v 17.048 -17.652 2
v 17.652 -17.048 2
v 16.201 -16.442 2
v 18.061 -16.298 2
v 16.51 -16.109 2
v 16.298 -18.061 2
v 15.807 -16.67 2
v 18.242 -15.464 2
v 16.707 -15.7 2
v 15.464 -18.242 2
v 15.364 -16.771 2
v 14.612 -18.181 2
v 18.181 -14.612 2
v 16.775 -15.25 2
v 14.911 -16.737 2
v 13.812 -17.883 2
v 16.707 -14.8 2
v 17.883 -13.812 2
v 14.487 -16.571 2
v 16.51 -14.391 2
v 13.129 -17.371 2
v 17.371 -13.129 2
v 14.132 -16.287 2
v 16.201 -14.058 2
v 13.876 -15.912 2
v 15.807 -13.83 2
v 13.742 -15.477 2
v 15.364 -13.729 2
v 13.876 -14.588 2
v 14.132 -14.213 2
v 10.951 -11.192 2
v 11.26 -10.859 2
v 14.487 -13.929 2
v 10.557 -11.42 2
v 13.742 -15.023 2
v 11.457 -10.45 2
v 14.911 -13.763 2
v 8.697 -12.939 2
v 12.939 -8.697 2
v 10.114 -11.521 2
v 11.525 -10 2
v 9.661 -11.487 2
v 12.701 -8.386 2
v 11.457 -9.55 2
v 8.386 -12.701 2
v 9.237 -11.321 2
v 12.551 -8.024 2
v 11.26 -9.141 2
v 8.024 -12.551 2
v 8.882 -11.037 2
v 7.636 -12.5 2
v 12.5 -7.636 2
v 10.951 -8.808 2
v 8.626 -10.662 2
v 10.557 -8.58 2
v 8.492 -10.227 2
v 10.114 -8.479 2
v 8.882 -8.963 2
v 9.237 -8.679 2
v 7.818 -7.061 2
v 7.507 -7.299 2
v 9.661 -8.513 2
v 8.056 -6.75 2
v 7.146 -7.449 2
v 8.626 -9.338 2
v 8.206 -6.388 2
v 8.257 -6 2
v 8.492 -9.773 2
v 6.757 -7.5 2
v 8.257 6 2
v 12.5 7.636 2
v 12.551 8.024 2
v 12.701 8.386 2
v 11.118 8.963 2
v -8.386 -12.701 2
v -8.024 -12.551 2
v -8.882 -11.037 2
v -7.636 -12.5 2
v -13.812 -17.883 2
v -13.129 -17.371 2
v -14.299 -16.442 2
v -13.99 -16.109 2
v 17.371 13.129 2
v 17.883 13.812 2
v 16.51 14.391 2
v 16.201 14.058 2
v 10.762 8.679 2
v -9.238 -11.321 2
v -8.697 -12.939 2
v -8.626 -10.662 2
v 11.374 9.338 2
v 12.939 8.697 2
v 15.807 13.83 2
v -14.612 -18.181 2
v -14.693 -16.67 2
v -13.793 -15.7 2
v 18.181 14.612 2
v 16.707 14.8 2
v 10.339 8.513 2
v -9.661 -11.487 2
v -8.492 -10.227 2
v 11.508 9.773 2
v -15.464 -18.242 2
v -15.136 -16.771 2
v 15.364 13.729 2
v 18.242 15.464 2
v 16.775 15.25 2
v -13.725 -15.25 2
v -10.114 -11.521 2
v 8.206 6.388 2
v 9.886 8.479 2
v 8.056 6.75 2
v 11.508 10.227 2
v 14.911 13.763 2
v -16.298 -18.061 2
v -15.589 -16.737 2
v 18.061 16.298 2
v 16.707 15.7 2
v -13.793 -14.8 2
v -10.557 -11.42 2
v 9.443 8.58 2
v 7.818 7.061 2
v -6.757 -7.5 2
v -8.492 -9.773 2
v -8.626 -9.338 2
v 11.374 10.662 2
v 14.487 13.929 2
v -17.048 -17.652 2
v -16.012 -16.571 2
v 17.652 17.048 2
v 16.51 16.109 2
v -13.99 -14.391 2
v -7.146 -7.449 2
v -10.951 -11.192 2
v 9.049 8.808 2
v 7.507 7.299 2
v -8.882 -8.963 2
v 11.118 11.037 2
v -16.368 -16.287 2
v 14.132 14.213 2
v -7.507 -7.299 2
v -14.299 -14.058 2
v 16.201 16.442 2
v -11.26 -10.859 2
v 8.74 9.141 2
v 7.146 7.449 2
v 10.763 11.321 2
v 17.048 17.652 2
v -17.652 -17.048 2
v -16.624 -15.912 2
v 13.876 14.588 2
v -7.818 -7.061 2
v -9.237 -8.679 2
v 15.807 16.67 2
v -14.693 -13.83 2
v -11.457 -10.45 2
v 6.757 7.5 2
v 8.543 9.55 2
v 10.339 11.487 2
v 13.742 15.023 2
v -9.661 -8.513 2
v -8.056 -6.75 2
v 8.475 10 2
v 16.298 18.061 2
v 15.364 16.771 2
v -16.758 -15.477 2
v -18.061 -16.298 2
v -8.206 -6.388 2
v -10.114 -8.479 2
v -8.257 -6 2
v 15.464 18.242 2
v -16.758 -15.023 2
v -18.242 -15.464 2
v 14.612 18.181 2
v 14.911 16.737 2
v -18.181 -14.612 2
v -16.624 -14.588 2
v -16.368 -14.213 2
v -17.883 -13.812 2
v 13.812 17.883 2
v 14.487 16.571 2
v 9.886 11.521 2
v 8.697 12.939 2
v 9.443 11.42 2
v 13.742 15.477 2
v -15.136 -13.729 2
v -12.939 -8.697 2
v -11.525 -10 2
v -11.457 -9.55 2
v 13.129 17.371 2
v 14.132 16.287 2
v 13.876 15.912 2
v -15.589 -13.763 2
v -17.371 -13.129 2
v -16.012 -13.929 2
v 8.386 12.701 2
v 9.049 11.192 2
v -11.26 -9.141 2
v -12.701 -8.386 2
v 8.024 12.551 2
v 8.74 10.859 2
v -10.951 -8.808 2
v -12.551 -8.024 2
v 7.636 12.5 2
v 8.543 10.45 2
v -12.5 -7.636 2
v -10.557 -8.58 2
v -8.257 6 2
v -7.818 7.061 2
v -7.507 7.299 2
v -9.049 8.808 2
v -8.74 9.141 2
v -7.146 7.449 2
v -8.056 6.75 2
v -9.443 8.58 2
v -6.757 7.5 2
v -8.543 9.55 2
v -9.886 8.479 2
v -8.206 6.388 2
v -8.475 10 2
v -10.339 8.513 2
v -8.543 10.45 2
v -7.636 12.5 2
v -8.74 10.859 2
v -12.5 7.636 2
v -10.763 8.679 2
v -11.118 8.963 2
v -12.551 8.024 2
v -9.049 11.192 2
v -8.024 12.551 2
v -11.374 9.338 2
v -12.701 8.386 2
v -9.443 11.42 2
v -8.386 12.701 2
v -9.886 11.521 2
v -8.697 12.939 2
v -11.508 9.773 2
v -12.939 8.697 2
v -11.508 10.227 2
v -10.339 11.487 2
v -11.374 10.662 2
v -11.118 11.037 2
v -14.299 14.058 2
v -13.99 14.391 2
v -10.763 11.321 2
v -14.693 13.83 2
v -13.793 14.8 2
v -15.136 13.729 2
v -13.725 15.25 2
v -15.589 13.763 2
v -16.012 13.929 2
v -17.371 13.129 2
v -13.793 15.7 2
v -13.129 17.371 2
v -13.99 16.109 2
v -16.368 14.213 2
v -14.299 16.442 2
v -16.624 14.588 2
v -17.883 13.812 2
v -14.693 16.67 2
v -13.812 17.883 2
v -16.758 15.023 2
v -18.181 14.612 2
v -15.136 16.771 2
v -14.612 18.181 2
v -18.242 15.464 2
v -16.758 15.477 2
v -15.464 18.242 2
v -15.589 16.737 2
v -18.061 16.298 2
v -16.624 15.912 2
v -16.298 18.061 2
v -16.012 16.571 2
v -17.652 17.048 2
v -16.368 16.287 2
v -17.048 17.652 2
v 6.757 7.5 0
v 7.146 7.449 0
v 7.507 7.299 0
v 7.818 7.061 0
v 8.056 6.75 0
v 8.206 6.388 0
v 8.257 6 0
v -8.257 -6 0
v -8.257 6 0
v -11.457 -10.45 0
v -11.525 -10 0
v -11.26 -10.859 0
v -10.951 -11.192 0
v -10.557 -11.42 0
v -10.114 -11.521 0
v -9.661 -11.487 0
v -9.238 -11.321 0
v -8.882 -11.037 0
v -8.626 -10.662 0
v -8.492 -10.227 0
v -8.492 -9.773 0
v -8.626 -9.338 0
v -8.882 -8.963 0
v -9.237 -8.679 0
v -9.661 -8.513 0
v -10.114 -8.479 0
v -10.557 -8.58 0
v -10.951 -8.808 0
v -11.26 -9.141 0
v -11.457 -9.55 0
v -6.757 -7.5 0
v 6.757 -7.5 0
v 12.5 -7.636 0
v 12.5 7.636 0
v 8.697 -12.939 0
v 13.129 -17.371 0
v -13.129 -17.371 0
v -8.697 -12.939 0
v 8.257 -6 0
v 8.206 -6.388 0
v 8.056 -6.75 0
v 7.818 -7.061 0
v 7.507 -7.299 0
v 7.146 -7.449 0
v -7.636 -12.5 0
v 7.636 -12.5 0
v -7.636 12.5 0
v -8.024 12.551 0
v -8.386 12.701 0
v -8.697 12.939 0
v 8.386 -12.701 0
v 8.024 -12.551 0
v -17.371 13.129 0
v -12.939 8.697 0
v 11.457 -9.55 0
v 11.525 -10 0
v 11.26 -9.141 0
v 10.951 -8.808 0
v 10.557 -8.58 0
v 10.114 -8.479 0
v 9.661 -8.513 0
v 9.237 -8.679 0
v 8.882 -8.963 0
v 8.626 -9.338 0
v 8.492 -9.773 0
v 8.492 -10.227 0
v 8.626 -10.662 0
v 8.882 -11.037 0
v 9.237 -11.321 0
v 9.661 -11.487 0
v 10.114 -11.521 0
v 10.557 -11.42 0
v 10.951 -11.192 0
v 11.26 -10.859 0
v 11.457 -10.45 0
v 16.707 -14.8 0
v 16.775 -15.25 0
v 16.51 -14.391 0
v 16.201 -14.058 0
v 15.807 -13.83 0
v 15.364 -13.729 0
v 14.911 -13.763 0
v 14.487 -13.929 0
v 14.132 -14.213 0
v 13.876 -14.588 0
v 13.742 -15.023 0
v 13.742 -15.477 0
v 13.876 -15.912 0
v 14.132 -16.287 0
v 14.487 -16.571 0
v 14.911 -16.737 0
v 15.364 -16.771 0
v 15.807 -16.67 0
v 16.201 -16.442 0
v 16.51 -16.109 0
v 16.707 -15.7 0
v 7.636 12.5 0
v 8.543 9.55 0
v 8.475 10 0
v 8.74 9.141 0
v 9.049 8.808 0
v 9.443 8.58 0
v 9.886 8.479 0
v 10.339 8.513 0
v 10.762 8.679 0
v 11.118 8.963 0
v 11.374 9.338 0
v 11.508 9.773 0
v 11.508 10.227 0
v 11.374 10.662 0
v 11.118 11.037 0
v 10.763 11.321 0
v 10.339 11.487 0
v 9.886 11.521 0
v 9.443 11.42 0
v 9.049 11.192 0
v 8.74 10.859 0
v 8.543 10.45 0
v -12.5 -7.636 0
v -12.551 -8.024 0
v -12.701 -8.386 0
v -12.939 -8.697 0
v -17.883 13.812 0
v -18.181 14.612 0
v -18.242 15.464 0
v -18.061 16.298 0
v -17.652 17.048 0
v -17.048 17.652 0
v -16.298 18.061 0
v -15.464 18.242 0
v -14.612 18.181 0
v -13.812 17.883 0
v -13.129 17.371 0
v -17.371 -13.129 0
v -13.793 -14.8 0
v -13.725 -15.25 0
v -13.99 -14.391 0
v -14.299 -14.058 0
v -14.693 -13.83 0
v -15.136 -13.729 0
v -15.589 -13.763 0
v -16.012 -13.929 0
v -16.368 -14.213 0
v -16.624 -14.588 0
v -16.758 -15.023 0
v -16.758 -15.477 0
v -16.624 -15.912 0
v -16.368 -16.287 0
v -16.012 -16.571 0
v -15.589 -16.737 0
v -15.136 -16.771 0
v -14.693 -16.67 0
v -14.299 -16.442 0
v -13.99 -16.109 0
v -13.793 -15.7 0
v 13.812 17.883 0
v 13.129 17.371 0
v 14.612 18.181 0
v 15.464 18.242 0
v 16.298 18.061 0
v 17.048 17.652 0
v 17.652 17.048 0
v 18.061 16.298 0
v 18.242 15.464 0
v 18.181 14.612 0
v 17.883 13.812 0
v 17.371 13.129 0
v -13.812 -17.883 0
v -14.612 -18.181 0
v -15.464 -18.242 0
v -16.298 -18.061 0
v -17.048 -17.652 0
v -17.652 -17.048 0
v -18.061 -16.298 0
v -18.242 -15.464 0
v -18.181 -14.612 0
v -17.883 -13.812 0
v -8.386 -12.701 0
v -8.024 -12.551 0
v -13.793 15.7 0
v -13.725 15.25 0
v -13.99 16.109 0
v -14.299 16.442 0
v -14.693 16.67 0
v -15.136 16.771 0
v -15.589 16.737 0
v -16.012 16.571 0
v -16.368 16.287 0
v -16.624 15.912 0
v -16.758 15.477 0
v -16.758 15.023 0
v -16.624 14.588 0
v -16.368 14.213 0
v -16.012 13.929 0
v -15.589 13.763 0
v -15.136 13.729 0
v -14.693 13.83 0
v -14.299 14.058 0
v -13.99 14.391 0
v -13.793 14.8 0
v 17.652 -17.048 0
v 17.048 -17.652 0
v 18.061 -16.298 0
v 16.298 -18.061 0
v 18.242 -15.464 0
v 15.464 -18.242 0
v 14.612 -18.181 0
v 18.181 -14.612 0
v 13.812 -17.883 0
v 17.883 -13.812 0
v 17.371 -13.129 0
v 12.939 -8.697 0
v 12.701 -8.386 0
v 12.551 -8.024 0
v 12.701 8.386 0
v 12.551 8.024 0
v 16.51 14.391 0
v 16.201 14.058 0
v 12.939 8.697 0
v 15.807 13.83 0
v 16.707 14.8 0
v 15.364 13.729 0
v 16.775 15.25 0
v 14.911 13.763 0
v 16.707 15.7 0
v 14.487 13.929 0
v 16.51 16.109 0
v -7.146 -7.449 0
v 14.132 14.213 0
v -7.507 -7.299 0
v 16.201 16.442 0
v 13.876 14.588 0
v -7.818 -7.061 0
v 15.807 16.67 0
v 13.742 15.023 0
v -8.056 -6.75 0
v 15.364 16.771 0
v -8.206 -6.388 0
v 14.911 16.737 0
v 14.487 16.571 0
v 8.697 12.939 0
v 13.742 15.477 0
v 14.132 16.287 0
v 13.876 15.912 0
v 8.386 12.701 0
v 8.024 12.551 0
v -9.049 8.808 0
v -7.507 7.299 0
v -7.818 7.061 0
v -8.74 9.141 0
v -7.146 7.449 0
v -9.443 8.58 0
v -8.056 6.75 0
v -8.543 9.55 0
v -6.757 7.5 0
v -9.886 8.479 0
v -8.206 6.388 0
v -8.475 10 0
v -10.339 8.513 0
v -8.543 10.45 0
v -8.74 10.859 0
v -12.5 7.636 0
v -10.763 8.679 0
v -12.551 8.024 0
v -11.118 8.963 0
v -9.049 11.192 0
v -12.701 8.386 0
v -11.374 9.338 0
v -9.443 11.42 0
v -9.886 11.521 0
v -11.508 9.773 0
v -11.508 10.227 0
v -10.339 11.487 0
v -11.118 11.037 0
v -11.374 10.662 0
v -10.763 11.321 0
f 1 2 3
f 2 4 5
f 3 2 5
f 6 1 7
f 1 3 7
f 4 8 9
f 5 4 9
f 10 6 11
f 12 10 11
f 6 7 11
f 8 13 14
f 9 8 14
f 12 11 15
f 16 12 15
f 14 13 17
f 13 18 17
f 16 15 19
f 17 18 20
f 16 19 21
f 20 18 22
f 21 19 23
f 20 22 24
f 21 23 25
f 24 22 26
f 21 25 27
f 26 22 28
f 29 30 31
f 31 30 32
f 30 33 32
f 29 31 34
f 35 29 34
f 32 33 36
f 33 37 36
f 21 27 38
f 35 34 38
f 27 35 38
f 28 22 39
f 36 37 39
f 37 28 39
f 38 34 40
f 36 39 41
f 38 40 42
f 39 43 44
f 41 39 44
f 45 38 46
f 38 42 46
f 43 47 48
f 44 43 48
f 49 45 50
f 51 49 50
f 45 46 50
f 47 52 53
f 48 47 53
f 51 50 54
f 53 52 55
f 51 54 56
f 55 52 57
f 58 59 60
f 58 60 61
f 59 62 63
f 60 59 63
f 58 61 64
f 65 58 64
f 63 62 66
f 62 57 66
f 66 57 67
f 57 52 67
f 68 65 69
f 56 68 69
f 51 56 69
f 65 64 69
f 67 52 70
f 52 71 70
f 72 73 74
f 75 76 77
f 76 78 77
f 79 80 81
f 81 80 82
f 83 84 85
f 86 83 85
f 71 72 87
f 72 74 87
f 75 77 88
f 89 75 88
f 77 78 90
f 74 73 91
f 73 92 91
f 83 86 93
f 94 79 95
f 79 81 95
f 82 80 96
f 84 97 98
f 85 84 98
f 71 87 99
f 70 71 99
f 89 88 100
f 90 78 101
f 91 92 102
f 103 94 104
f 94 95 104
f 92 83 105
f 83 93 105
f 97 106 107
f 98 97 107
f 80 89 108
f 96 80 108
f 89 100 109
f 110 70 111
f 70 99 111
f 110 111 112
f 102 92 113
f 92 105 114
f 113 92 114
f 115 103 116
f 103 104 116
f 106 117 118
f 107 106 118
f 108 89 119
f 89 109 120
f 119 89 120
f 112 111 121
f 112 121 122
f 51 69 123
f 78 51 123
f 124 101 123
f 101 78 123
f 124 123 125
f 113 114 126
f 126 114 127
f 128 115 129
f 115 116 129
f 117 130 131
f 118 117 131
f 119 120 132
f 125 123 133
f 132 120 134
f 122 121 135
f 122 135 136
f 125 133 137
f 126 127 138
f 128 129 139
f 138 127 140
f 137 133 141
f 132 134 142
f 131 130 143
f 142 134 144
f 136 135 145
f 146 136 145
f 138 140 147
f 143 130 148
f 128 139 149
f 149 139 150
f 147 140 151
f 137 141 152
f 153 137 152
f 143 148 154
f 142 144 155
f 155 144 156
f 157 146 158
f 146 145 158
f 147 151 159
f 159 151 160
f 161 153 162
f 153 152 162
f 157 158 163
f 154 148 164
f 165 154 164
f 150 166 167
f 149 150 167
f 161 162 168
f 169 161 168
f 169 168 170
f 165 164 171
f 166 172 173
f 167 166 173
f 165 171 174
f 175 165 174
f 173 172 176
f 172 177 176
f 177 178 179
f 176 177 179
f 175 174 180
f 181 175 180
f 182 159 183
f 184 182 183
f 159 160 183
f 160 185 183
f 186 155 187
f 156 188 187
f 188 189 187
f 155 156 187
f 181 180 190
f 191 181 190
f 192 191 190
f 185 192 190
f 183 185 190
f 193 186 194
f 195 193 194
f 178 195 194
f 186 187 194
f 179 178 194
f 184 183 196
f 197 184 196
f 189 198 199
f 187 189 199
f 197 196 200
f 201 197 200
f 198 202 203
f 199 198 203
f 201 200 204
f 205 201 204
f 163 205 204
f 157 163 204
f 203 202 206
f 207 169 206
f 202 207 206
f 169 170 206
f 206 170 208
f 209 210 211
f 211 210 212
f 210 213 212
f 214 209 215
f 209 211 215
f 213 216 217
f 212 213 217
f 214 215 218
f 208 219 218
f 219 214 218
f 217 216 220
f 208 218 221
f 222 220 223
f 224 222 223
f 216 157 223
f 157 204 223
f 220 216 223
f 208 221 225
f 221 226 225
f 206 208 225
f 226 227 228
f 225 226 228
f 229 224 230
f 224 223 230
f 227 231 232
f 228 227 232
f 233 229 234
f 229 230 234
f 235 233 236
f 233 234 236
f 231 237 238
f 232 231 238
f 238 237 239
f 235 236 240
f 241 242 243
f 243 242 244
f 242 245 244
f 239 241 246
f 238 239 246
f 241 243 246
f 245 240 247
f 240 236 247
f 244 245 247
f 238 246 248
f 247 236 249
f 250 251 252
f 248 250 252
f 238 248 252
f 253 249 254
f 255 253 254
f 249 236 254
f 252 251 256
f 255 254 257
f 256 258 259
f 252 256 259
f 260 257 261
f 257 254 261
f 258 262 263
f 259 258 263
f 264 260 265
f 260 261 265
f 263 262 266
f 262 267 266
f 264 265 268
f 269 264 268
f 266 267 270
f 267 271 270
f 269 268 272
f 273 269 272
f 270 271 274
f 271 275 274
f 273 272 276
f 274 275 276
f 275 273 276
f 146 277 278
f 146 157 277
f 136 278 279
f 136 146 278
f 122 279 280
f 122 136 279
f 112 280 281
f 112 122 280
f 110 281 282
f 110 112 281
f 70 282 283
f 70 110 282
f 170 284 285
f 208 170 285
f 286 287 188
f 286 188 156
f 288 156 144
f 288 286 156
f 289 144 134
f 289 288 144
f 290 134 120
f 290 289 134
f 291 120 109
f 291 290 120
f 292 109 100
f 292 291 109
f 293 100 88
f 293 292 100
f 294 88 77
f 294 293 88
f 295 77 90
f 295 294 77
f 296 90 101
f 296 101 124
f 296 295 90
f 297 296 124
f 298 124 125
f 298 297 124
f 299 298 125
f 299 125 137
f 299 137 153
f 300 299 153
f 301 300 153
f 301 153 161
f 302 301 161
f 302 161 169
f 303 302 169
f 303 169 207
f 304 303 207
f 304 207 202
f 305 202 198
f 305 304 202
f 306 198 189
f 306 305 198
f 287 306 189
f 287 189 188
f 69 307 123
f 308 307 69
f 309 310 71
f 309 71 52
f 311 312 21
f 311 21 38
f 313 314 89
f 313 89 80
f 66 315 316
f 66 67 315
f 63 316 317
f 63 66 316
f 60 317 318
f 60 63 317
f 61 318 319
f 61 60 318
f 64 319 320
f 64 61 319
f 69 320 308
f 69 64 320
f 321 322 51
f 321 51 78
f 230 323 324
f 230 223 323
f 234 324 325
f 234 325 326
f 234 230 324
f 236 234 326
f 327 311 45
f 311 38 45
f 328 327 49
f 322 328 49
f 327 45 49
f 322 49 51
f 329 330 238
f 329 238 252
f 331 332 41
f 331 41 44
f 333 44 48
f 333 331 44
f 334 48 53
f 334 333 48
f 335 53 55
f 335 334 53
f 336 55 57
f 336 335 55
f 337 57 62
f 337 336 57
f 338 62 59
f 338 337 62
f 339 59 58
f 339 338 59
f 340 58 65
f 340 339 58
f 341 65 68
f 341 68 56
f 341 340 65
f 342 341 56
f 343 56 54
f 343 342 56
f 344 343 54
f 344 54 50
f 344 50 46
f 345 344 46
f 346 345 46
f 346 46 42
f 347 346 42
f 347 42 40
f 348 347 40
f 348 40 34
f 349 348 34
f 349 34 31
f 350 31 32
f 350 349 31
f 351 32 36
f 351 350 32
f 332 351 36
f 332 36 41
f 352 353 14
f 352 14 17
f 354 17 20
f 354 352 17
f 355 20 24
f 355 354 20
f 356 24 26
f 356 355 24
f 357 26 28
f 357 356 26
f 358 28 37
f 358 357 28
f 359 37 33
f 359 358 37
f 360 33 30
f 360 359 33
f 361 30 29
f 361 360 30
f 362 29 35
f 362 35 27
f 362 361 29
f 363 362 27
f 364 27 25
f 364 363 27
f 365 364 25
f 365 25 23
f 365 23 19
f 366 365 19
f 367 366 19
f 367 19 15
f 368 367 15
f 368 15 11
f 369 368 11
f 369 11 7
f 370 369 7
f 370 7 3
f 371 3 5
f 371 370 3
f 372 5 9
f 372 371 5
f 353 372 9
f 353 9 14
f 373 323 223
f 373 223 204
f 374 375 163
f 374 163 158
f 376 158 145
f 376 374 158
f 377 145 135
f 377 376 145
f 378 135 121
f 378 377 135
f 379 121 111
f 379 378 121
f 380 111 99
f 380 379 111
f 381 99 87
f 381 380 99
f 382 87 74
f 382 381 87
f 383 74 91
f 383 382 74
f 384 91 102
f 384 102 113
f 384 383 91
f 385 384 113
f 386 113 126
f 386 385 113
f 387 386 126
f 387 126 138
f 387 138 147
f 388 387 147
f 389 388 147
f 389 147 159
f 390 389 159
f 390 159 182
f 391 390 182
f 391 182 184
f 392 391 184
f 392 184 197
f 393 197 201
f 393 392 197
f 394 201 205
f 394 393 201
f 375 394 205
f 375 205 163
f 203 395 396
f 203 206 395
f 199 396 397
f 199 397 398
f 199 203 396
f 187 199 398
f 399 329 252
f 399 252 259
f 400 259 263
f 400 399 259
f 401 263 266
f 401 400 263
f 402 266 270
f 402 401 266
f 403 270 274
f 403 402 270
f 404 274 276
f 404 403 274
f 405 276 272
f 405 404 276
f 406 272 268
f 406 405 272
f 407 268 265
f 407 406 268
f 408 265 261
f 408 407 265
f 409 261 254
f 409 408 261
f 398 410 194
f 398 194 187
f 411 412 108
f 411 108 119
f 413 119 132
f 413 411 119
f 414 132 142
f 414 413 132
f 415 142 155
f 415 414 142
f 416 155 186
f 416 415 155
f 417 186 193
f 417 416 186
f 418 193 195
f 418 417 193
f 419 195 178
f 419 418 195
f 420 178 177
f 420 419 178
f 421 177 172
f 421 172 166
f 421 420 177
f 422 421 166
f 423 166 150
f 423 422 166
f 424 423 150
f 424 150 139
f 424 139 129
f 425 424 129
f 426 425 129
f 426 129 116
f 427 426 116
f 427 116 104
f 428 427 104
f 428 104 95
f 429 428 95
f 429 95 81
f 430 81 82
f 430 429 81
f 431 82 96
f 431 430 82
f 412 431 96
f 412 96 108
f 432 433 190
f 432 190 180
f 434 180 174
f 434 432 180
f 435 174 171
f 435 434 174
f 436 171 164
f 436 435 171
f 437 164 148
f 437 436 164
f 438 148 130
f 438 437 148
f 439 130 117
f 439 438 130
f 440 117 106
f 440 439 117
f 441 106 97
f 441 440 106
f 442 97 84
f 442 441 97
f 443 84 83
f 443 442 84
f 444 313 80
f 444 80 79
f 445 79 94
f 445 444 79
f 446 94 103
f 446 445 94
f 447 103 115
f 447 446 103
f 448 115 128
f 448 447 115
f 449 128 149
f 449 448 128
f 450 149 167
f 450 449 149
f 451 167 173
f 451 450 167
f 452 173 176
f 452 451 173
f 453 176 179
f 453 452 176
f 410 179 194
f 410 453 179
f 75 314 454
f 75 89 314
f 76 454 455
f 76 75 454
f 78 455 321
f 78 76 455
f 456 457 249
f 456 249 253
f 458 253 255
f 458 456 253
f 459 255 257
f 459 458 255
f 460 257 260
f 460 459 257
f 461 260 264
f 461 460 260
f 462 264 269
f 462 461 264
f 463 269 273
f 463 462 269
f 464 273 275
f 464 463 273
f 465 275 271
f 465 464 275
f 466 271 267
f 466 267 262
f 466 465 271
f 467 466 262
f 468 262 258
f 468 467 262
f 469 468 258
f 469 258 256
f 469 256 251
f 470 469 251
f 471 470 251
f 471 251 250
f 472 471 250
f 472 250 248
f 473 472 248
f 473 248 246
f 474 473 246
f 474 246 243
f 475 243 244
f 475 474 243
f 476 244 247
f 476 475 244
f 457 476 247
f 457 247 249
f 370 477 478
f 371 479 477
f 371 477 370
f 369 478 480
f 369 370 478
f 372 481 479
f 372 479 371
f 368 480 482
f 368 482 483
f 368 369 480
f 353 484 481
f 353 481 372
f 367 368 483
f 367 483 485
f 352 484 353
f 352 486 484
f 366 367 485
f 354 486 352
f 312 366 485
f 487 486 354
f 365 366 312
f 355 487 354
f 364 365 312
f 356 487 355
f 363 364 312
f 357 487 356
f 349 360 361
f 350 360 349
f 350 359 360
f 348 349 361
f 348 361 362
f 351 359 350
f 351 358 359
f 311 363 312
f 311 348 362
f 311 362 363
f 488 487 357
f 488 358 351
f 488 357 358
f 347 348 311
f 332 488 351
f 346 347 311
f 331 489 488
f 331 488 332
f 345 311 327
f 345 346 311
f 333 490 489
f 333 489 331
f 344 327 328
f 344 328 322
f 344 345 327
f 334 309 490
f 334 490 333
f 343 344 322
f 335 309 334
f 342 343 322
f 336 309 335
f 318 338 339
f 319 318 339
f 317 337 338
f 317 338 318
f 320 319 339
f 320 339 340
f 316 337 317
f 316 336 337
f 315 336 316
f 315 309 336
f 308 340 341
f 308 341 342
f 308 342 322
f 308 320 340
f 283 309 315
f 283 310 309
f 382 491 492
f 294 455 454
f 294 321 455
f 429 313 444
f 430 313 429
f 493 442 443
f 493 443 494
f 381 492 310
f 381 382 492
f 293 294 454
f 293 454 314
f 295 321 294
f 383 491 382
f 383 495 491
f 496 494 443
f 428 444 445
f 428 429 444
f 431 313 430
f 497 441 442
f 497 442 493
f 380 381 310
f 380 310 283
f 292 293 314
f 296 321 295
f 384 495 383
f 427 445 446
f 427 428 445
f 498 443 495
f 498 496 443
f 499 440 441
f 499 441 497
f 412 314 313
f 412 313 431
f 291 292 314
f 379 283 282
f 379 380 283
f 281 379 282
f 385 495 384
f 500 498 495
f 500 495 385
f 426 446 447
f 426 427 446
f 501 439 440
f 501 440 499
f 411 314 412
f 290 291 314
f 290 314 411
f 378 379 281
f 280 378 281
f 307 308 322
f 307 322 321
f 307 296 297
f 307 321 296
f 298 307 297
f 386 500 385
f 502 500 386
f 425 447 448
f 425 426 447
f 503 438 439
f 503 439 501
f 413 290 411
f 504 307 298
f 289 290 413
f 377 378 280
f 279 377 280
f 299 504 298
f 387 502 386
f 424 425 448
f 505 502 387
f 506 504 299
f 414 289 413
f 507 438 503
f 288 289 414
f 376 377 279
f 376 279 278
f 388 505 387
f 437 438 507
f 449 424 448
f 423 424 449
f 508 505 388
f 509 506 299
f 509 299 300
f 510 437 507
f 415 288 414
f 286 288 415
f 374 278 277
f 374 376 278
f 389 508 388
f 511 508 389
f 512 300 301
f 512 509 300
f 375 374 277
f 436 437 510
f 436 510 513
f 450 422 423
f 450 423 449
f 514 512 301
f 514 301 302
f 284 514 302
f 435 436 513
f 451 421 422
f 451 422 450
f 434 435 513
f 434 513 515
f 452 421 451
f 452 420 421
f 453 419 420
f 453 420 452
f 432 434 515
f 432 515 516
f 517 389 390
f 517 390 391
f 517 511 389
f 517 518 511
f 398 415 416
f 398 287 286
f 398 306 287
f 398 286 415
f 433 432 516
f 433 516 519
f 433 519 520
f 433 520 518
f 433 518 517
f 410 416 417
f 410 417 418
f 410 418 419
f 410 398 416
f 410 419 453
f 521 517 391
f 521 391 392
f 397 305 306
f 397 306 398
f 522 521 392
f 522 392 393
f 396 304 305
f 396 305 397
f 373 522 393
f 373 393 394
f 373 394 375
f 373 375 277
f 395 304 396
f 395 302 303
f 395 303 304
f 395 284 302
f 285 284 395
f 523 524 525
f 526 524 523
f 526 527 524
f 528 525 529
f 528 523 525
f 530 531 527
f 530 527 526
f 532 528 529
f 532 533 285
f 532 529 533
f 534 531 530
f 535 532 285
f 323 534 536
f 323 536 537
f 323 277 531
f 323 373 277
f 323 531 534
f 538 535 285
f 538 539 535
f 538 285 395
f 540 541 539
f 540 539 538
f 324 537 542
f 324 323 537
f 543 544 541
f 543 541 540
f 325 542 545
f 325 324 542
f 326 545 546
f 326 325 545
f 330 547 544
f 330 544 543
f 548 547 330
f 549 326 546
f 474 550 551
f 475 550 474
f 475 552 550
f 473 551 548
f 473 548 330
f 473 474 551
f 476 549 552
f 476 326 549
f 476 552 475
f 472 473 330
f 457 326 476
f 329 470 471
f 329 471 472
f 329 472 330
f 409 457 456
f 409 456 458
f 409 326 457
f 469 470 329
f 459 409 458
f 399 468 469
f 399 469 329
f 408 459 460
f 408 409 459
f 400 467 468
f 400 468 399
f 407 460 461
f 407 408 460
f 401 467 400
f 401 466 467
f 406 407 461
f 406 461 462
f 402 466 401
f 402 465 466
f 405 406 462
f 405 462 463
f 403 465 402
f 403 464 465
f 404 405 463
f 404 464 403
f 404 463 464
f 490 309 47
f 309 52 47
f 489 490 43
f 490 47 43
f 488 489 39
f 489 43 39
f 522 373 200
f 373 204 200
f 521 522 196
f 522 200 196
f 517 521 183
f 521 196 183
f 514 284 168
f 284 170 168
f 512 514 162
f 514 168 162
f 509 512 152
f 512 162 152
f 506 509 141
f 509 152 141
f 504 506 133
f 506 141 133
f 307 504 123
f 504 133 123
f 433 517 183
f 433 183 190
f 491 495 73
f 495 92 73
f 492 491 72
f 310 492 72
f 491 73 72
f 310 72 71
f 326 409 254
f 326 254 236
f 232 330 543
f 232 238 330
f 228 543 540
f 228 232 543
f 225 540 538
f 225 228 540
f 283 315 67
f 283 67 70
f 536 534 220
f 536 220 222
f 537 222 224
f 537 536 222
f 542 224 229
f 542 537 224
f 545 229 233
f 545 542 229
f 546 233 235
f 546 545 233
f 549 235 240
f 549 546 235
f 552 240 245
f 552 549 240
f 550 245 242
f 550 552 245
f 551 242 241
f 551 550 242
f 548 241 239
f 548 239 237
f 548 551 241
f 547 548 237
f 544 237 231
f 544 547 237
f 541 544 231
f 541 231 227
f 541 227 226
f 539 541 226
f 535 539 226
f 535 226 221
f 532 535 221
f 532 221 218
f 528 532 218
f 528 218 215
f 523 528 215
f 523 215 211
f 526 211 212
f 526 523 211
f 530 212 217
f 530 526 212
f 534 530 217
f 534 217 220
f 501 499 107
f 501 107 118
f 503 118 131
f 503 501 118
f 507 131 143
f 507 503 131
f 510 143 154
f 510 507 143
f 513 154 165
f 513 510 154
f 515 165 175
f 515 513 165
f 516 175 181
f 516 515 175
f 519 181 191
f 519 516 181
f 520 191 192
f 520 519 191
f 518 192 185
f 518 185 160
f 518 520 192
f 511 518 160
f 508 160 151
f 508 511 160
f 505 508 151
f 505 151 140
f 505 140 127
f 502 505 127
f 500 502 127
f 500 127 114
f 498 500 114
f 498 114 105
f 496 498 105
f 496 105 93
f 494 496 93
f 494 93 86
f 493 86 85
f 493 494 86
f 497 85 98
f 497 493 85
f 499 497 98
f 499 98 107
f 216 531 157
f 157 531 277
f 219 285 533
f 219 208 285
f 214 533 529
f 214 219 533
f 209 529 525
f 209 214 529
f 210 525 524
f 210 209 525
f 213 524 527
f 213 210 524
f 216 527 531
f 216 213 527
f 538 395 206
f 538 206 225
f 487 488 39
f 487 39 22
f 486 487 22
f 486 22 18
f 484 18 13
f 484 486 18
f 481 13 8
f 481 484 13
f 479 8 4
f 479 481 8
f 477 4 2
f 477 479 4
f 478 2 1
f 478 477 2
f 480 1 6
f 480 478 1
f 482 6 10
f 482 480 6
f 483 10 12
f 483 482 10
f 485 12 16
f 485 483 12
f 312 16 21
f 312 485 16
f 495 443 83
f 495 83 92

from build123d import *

# Parameters (mm, degrees)
SKETCH_1_R      = 1.525
SKETCH_1_W      = 16.514718626
SKETCH_1_H      = 15
EXTRUDE_1_DEPTH = 2
FILLET_1_R      = 1.5


with BuildPart() as part:
    # 草图1 → 凸台-拉伸1 (new body)
    with BuildSketch(Plane.XY):
        with BuildLine():
            Line((-8.257359313, 12.5), (8.257359313, 12.5))
            Line((8.257359313, 12.5), (13.128679656, 17.371320344))
            ThreePointArc((13.128679656, 17.371320344), (17.371320344, 17.371320344), (17.371320344, 13.128679656))
            Line((17.371320344, 13.128679656), (12.5, 8.257359313))
            Line((12.5, 8.257359313), (12.5, -8.257359313))
            Line((12.5, -8.257359313), (17.371320344, -13.128679656))
            ThreePointArc((17.371320344, -13.128679656), (17.371320344, -17.371320344), (13.128679656, -17.371320344))
            Line((13.128679656, -17.371320344), (8.257359313, -12.5))
            Line((8.257359313, -12.5), (-8.257359313, -12.5))
            Line((-8.257359313, -12.5), (-13.128679656, -17.371320344))
            ThreePointArc((-13.128679656, -17.371320344), (-17.371320344, -17.371320344), (-17.371320344, -13.128679656))
            Line((-17.371320344, -13.128679656), (-12.5, -8.257359313))
            Line((-12.5, -8.257359313), (-12.5, 8.257359313))
            Line((-12.5, 8.257359313), (-17.371320344, 13.128679656))
            ThreePointArc((-17.371320344, 13.128679656), (-17.371320344, 17.371320344), (-13.128679656, 17.371320344))
            Line((-13.128679656, 17.371320344), (-8.257359313, 12.5))
        make_face()
        with Locations((-15.25, 15.25)):
            Circle(SKETCH_1_R, mode=Mode.SUBTRACT)
        with Locations((15.25, 15.25)):
            Circle(SKETCH_1_R, mode=Mode.SUBTRACT)
        with Locations((-15.25, -15.25)):
            Circle(SKETCH_1_R, mode=Mode.SUBTRACT)
        with Locations((15.25, -15.25)):
            Circle(SKETCH_1_R, mode=Mode.SUBTRACT)
        with Locations((-10, 10)):
            Circle(SKETCH_1_R, mode=Mode.SUBTRACT)
        with Locations(Location((10, 10, 0), (0, 0, 180))):
            Circle(SKETCH_1_R, mode=Mode.SUBTRACT)
        with Locations((10, -10)):
            Circle(SKETCH_1_R, mode=Mode.SUBTRACT)
        with Locations(Location((-10, -10, 0), (0, 0, 180))):
            Circle(SKETCH_1_R, mode=Mode.SUBTRACT)
        Rectangle(SKETCH_1_W, SKETCH_1_H, mode=Mode.SUBTRACT)
    extrude(amount=EXTRUDE_1_DEPTH)

    # 圆角1
    fillet_1_edges = [part.edges().sort_by_distance(p)[0] for p in [
        (-8.257359313, 12.5, 1),
        (8.257359313, 12.5, 1),
        (12.5, 8.257359313, 1),
        (12.5, -8.257359313, 1),
        (8.257359313, -12.5, 1),
        (-8.257359313, -12.5, 1),
        (-12.5, -8.257359313, 1),
        (-12.5, 8.257359313, 1),
        (-8.257359313, 7.5, 1),
        (-8.257359313, -7.5, 1),
        (8.257359313, -7.5, 1),
        (8.257359313, 7.5, 1),
    ]]
    fillet(fillet_1_edges, radius=FILLET_1_R)


solid = part.part
